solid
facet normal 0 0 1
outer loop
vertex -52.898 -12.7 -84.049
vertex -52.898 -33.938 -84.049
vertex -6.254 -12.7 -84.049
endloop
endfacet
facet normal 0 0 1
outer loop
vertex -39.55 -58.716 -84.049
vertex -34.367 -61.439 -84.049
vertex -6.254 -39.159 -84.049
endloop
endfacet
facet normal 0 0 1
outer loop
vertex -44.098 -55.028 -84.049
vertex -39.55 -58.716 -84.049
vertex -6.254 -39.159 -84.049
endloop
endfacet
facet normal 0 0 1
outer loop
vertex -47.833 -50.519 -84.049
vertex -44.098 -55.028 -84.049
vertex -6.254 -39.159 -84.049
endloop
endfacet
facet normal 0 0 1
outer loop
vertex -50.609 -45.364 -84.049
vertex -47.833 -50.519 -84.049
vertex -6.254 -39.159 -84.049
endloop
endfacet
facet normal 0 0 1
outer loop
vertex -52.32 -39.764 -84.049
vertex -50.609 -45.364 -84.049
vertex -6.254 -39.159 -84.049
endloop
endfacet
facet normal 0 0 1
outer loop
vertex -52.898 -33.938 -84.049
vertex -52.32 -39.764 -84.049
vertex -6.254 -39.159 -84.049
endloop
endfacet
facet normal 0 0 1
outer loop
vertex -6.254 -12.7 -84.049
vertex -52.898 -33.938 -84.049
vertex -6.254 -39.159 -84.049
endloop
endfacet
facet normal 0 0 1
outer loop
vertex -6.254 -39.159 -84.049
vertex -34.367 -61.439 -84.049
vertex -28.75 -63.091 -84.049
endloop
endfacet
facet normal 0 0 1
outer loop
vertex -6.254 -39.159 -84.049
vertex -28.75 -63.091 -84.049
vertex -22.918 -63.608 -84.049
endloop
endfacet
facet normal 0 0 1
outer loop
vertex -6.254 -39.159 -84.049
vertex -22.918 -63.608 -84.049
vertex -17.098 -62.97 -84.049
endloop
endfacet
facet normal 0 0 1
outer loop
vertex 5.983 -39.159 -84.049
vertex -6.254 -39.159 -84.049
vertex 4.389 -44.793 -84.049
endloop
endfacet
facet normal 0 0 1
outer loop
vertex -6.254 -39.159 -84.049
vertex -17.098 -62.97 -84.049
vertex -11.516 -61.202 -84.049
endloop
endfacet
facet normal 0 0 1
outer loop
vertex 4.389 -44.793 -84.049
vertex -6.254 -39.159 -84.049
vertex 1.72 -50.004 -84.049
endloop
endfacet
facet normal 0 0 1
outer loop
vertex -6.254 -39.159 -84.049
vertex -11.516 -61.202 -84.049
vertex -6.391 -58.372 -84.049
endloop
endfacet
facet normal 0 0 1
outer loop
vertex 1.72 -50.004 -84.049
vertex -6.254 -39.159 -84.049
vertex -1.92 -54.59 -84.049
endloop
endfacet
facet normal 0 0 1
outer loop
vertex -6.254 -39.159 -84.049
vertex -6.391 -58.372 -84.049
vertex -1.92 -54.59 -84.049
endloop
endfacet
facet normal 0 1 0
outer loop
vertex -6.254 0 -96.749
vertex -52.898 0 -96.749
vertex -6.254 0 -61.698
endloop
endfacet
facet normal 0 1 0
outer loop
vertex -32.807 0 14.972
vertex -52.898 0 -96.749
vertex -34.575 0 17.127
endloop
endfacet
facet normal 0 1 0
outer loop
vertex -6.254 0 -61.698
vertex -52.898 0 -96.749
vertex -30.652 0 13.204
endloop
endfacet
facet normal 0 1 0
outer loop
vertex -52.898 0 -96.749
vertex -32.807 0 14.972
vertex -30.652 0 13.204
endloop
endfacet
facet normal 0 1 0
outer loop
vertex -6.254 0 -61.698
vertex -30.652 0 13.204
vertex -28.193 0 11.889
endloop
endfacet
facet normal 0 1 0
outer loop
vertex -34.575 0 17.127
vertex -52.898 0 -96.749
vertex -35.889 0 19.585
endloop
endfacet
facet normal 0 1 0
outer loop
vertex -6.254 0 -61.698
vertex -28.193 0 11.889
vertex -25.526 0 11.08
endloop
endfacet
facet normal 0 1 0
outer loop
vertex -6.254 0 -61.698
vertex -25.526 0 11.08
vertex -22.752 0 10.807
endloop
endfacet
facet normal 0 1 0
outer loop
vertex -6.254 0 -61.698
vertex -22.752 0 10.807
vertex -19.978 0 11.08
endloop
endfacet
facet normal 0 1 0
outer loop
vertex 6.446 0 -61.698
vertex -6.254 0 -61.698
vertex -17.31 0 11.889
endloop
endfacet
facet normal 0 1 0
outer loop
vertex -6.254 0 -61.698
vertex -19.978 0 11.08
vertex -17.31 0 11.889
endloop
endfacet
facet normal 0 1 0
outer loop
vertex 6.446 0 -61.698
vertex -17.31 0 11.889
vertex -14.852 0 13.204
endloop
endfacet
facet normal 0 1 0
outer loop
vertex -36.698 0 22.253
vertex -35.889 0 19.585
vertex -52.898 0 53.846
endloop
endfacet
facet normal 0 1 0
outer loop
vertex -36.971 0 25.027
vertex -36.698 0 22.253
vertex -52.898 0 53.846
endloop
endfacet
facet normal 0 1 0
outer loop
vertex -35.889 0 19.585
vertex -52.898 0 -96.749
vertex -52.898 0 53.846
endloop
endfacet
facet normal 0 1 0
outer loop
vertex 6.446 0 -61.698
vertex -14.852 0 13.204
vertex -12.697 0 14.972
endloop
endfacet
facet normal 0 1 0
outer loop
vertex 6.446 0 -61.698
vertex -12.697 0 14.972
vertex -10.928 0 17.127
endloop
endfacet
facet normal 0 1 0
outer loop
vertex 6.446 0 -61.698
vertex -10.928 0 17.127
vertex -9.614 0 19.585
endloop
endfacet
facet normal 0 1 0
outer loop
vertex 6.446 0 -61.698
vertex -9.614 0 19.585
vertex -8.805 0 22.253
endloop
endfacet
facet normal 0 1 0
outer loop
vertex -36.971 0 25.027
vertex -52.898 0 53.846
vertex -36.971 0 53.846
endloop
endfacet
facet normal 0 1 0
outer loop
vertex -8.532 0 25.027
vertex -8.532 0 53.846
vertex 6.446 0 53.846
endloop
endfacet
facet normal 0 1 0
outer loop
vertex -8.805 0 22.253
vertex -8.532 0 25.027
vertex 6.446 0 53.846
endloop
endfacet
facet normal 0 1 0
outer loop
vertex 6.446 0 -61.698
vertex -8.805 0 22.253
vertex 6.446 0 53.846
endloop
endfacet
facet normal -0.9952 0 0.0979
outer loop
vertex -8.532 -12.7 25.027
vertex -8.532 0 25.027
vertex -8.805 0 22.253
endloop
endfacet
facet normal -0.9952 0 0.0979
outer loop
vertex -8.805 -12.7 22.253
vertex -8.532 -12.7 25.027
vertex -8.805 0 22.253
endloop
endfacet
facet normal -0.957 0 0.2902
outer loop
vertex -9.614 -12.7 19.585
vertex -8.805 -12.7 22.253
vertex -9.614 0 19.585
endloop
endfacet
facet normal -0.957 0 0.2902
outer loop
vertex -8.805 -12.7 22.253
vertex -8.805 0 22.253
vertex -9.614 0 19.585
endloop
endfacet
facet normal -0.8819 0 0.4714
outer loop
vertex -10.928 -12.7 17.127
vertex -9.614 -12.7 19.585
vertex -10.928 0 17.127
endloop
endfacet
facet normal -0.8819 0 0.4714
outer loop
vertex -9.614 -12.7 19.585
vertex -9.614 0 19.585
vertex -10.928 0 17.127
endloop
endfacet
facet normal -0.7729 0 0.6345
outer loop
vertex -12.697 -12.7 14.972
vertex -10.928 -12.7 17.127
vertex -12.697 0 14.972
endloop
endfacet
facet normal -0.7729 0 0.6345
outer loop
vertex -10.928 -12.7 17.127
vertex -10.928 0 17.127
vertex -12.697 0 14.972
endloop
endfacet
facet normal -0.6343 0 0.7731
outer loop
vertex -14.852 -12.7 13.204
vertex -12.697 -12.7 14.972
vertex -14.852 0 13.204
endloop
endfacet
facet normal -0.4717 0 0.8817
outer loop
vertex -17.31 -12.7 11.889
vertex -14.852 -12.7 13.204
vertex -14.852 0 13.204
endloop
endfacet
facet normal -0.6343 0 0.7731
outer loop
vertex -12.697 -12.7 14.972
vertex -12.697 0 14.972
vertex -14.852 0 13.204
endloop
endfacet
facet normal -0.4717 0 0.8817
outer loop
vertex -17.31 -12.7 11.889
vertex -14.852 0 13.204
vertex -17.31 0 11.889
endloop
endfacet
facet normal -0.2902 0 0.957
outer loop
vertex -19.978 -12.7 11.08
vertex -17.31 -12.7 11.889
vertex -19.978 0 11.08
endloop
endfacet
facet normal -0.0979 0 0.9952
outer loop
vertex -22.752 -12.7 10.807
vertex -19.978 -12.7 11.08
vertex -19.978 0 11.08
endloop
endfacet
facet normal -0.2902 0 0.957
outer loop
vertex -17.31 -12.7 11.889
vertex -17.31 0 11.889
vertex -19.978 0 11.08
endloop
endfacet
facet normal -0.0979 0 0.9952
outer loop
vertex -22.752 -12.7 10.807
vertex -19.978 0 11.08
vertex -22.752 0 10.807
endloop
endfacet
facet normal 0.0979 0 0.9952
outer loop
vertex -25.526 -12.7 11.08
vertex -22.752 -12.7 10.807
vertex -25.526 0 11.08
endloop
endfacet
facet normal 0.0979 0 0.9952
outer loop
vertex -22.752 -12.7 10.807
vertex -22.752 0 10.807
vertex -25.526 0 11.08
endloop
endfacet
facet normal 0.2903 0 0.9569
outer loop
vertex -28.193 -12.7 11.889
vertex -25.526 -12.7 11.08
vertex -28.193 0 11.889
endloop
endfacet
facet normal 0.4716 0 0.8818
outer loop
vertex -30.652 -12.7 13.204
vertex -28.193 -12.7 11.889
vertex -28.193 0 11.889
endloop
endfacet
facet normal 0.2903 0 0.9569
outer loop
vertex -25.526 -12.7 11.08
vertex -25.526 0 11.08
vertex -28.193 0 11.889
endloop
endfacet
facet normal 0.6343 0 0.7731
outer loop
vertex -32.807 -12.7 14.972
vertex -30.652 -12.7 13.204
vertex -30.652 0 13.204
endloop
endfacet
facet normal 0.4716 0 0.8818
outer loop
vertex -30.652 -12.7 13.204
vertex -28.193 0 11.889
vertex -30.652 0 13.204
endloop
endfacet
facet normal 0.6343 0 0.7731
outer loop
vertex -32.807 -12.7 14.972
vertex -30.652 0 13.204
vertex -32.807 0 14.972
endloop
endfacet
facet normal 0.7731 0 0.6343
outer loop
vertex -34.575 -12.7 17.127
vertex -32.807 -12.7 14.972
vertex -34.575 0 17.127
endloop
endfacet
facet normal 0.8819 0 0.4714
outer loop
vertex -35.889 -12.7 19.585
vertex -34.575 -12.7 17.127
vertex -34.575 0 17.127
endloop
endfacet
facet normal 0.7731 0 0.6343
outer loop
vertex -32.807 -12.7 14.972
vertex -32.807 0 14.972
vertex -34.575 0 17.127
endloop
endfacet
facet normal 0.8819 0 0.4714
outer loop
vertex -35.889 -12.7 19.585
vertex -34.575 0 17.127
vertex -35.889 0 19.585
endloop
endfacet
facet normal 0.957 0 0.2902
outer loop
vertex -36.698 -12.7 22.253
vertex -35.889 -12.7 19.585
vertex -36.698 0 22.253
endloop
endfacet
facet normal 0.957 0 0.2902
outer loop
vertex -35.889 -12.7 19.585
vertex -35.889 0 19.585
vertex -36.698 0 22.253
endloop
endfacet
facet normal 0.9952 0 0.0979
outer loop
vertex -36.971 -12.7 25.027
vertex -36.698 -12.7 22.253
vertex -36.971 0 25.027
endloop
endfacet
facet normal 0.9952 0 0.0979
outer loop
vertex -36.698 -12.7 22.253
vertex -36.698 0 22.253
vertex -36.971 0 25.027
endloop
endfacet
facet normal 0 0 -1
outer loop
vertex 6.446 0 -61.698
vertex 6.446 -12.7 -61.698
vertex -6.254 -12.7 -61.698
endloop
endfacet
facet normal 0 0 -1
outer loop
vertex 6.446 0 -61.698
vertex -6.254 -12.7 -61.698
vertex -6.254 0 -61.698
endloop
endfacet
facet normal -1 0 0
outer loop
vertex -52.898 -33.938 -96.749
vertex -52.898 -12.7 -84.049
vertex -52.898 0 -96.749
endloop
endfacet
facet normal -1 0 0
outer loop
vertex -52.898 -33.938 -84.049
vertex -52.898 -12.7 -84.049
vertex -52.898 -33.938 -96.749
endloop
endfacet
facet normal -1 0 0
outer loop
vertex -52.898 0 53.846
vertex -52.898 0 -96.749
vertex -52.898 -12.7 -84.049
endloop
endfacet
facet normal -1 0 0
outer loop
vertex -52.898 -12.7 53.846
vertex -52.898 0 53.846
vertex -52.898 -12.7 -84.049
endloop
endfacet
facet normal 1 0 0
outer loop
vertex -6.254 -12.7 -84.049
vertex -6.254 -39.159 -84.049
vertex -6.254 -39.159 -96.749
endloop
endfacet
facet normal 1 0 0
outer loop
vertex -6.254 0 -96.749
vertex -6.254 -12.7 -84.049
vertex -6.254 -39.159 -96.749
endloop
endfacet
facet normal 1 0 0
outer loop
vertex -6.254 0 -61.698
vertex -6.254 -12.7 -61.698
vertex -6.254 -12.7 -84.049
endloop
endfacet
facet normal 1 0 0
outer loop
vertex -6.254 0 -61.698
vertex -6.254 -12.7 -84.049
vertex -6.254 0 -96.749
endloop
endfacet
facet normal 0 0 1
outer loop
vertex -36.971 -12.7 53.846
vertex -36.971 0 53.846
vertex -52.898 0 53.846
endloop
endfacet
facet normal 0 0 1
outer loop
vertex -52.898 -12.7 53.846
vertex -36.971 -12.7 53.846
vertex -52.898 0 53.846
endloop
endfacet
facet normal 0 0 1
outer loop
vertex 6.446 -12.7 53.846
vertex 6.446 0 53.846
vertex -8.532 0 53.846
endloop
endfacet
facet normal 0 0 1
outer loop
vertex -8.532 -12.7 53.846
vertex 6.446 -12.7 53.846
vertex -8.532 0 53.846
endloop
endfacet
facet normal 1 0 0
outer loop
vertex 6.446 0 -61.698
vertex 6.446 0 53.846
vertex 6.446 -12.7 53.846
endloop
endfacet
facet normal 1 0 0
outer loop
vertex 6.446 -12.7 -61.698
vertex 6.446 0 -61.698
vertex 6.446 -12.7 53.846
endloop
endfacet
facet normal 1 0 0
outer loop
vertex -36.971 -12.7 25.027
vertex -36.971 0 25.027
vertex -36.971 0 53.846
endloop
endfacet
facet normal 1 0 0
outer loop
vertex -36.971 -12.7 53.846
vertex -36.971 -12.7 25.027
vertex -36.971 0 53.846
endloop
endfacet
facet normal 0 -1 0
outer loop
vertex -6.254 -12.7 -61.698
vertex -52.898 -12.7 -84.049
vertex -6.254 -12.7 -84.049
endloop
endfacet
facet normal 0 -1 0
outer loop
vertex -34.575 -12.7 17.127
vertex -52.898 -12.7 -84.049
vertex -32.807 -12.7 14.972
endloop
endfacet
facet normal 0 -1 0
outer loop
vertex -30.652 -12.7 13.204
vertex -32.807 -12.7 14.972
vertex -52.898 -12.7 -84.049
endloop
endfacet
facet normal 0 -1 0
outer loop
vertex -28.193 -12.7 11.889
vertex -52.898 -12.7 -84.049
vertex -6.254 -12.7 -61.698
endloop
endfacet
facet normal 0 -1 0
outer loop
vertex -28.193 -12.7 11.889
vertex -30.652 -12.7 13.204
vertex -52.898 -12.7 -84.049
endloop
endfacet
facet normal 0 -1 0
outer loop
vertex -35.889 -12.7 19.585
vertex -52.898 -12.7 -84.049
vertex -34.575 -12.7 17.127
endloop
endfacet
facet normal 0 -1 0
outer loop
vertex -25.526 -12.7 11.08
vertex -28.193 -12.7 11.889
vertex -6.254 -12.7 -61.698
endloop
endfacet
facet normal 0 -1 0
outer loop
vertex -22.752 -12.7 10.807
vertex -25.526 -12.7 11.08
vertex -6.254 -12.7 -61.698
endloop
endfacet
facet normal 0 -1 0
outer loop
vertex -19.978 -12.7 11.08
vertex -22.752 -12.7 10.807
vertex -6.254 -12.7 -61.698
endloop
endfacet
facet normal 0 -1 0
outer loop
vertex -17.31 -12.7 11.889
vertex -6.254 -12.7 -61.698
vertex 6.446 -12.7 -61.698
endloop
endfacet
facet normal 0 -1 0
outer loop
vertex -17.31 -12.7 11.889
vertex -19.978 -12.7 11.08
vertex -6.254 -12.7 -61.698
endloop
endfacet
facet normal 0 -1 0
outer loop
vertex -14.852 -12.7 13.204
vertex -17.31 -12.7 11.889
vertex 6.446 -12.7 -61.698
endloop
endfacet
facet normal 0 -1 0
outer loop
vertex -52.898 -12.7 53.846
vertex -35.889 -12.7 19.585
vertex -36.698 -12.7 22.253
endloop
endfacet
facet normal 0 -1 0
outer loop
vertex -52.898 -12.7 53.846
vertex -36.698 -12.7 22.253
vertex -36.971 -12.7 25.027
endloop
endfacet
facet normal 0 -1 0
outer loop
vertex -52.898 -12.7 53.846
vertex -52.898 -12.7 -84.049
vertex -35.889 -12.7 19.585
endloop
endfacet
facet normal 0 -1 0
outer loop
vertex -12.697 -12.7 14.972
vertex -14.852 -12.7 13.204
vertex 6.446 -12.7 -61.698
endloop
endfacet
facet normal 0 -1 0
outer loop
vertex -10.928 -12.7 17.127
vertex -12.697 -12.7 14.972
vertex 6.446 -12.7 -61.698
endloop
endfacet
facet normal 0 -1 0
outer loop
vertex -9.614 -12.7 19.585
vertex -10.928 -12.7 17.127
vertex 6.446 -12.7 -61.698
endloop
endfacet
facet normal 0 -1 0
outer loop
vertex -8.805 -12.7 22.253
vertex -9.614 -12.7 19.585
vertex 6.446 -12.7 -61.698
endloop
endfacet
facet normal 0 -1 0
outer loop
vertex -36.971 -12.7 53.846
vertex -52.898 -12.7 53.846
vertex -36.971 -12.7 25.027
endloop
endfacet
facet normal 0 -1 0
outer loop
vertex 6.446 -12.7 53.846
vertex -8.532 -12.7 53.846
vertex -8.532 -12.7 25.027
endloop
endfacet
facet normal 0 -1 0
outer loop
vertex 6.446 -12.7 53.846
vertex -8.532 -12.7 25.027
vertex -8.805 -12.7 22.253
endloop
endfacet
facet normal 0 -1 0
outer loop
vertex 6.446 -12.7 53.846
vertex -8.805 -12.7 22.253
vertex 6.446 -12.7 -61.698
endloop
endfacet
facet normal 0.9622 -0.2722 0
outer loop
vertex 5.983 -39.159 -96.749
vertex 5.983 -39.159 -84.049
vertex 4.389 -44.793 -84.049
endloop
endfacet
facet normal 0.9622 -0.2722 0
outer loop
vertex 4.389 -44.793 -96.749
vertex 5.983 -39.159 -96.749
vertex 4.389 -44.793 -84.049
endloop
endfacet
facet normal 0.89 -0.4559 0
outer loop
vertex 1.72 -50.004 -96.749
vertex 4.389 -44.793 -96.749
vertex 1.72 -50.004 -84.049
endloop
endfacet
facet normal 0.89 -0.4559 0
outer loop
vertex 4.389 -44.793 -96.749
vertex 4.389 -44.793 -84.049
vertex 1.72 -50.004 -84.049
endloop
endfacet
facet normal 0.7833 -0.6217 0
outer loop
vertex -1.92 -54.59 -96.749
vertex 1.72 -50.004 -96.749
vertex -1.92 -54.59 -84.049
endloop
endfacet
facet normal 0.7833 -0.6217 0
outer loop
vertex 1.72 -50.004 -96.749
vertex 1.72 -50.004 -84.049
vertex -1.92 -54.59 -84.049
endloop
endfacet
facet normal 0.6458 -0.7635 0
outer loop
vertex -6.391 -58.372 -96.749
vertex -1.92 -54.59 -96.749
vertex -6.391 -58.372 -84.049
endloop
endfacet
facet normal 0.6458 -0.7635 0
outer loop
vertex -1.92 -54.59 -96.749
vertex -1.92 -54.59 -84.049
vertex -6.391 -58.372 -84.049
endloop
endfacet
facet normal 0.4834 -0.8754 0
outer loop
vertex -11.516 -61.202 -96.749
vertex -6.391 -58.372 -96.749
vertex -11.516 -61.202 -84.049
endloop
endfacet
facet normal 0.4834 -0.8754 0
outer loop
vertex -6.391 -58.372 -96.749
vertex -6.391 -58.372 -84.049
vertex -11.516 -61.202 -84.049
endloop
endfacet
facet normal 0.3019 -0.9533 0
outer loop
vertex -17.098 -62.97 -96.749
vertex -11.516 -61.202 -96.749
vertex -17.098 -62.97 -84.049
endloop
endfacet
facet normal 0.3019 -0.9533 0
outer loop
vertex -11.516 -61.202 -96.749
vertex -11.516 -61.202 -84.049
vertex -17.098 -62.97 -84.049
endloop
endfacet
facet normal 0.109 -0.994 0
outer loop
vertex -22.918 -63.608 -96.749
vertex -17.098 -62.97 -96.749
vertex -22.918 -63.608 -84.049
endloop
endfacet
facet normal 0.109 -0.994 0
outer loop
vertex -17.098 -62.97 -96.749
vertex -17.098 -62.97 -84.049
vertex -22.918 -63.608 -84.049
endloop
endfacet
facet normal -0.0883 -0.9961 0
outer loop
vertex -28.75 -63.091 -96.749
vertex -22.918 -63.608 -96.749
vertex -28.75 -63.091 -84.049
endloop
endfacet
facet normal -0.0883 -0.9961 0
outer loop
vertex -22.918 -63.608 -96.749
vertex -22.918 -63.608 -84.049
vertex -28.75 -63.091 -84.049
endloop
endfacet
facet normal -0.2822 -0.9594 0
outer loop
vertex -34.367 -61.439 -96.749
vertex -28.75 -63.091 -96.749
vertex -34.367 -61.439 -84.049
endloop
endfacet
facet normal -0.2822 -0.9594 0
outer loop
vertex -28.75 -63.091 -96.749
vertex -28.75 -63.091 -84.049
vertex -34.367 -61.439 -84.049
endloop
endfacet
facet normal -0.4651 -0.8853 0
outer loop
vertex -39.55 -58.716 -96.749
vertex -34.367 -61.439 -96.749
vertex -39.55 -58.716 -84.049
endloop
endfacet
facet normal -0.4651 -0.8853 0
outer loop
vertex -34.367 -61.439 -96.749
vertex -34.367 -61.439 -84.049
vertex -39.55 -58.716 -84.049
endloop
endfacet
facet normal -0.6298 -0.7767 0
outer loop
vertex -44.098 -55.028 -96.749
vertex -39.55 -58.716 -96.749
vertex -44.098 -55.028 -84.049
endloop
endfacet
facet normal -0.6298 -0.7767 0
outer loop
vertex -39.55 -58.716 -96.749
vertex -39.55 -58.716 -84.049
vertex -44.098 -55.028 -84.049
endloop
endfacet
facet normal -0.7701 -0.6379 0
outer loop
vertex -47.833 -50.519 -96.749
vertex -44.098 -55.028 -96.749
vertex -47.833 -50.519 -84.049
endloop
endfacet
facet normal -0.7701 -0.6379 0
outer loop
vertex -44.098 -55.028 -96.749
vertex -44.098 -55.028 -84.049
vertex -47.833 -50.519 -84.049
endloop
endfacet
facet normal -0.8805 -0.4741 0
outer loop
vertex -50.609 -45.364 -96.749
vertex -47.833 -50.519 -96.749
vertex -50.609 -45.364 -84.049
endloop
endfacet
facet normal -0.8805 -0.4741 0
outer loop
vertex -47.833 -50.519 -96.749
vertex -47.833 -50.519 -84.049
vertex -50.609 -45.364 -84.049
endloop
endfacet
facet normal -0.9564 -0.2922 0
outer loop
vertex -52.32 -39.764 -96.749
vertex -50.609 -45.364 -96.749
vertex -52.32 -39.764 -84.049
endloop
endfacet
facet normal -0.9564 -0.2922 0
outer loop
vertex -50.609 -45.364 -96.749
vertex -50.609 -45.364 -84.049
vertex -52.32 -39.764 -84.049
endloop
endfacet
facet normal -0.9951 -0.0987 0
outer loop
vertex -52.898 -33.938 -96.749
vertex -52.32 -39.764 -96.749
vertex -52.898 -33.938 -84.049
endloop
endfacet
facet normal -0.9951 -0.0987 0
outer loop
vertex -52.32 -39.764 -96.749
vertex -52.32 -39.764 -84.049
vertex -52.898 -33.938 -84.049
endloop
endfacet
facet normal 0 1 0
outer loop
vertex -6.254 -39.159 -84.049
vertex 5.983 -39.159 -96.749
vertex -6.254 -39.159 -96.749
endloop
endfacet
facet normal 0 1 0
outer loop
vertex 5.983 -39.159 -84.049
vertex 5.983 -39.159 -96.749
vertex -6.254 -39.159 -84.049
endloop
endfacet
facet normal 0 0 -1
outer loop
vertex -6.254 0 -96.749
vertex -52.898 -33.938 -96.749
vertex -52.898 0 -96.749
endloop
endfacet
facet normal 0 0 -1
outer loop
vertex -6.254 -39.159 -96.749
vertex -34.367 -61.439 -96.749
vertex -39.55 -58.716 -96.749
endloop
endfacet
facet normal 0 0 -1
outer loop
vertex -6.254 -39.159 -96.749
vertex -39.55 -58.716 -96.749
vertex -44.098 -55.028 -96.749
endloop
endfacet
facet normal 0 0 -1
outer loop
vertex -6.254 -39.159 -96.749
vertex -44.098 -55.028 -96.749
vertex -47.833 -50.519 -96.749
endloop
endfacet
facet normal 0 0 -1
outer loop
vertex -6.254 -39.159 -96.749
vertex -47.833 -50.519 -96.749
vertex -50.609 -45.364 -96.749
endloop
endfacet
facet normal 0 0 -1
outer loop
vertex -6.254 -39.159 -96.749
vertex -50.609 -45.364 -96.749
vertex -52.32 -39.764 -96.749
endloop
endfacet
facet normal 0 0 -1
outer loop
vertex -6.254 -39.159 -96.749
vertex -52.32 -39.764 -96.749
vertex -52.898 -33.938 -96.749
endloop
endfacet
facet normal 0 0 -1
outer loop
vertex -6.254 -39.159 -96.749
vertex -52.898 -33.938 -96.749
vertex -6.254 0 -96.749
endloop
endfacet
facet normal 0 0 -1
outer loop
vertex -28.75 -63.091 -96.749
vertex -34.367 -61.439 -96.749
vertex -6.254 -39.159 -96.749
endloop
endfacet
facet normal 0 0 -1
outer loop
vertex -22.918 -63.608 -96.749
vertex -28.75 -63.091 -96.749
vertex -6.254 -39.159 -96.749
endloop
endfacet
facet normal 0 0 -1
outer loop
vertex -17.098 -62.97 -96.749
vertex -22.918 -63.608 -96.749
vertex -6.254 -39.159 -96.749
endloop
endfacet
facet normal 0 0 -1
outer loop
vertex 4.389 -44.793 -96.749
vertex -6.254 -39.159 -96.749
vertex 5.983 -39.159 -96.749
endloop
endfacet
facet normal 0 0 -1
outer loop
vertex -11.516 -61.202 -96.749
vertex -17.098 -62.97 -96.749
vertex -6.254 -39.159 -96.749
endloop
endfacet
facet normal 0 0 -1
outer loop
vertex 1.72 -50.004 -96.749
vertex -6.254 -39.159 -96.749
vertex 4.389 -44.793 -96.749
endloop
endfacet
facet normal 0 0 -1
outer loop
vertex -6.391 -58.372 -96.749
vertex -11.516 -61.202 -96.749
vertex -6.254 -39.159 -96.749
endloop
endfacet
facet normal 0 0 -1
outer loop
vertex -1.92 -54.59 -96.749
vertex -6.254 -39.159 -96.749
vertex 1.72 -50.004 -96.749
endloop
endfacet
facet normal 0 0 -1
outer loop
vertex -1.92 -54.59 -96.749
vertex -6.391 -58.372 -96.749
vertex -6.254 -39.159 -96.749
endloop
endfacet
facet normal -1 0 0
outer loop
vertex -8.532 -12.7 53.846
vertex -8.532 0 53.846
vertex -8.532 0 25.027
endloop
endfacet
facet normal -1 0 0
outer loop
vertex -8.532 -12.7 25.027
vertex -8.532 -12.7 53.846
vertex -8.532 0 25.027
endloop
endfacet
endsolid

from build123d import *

# Parameters (mm, degrees)
F1_DEPTH = 12.7
F2_W     = 59.3439098448
F2_H     = 33.9378900826
F3_DEPTH = 12.7
F4_W     = 39.1593687236
F4_H     = 35.0508086056
F5_DEPTH = 12.7


with BuildPart() as f1:
    # F0 (on Front) → F1 (new body)
    with BuildSketch(Plane.XZ):
        with BuildLine():
            Line((-36.9714461267, 53.8455955684), (-52.897606045, 53.8455955684))
            Line((-52.897606045, 53.8455955684), (-52.897606045, -84.0487536043))
            Line((-52.897606045, -84.0487536043), (6.4463037997, -84.0487536043))
            Line((6.4463037997, -84.0487536043), (6.4463037997, 53.8455955684))
            Line((6.4463037997, 53.8455955684), (-8.5318721831, 53.8455955684))
            Line((-8.5318721831, 53.8455955684), (-8.5318721831, 25.0268243253))
            ThreePointArc((-8.5318721831, 25.0268243253), (-22.7516591549, 10.8070373535), (-36.9714461267, 25.0268243253))
            Line((-36.9714461267, 25.0268243253), (-36.9714461267, 53.8455955684))
        make_face()
    extrude(amount=F1_DEPTH)

    # F2 (on face) → F3 (join)
    with BuildSketch(Plane(origin=(0, 0, -84.0487536043), x_dir=(1, 0, 0), z_dir=(0, 0, -1))):
        with Locations((-23.2256511226, 16.9689450413)):
            Rectangle(F2_W, F2_H)
        with BuildLine():
            Line((-52.897606045, 33.9378900826), (6.4463037997, 33.9378900826))
            ThreePointArc((6.4463037997, 33.9378900826), (-23.2256511226, 63.609845005), (-52.897606045, 33.9378900826))
        make_face()
    extrude(amount=F3_DEPTH)

    # F4 (on face) → F5 (cut)
    with BuildSketch(Plane.YZ.offset(6.4463037997)):
        with Locations((-19.5796843618, -79.2233493015)):
            Rectangle(F4_W, F4_H)
    extrude(amount=-F5_DEPTH, mode=Mode.SUBTRACT)


solid = f1.part
